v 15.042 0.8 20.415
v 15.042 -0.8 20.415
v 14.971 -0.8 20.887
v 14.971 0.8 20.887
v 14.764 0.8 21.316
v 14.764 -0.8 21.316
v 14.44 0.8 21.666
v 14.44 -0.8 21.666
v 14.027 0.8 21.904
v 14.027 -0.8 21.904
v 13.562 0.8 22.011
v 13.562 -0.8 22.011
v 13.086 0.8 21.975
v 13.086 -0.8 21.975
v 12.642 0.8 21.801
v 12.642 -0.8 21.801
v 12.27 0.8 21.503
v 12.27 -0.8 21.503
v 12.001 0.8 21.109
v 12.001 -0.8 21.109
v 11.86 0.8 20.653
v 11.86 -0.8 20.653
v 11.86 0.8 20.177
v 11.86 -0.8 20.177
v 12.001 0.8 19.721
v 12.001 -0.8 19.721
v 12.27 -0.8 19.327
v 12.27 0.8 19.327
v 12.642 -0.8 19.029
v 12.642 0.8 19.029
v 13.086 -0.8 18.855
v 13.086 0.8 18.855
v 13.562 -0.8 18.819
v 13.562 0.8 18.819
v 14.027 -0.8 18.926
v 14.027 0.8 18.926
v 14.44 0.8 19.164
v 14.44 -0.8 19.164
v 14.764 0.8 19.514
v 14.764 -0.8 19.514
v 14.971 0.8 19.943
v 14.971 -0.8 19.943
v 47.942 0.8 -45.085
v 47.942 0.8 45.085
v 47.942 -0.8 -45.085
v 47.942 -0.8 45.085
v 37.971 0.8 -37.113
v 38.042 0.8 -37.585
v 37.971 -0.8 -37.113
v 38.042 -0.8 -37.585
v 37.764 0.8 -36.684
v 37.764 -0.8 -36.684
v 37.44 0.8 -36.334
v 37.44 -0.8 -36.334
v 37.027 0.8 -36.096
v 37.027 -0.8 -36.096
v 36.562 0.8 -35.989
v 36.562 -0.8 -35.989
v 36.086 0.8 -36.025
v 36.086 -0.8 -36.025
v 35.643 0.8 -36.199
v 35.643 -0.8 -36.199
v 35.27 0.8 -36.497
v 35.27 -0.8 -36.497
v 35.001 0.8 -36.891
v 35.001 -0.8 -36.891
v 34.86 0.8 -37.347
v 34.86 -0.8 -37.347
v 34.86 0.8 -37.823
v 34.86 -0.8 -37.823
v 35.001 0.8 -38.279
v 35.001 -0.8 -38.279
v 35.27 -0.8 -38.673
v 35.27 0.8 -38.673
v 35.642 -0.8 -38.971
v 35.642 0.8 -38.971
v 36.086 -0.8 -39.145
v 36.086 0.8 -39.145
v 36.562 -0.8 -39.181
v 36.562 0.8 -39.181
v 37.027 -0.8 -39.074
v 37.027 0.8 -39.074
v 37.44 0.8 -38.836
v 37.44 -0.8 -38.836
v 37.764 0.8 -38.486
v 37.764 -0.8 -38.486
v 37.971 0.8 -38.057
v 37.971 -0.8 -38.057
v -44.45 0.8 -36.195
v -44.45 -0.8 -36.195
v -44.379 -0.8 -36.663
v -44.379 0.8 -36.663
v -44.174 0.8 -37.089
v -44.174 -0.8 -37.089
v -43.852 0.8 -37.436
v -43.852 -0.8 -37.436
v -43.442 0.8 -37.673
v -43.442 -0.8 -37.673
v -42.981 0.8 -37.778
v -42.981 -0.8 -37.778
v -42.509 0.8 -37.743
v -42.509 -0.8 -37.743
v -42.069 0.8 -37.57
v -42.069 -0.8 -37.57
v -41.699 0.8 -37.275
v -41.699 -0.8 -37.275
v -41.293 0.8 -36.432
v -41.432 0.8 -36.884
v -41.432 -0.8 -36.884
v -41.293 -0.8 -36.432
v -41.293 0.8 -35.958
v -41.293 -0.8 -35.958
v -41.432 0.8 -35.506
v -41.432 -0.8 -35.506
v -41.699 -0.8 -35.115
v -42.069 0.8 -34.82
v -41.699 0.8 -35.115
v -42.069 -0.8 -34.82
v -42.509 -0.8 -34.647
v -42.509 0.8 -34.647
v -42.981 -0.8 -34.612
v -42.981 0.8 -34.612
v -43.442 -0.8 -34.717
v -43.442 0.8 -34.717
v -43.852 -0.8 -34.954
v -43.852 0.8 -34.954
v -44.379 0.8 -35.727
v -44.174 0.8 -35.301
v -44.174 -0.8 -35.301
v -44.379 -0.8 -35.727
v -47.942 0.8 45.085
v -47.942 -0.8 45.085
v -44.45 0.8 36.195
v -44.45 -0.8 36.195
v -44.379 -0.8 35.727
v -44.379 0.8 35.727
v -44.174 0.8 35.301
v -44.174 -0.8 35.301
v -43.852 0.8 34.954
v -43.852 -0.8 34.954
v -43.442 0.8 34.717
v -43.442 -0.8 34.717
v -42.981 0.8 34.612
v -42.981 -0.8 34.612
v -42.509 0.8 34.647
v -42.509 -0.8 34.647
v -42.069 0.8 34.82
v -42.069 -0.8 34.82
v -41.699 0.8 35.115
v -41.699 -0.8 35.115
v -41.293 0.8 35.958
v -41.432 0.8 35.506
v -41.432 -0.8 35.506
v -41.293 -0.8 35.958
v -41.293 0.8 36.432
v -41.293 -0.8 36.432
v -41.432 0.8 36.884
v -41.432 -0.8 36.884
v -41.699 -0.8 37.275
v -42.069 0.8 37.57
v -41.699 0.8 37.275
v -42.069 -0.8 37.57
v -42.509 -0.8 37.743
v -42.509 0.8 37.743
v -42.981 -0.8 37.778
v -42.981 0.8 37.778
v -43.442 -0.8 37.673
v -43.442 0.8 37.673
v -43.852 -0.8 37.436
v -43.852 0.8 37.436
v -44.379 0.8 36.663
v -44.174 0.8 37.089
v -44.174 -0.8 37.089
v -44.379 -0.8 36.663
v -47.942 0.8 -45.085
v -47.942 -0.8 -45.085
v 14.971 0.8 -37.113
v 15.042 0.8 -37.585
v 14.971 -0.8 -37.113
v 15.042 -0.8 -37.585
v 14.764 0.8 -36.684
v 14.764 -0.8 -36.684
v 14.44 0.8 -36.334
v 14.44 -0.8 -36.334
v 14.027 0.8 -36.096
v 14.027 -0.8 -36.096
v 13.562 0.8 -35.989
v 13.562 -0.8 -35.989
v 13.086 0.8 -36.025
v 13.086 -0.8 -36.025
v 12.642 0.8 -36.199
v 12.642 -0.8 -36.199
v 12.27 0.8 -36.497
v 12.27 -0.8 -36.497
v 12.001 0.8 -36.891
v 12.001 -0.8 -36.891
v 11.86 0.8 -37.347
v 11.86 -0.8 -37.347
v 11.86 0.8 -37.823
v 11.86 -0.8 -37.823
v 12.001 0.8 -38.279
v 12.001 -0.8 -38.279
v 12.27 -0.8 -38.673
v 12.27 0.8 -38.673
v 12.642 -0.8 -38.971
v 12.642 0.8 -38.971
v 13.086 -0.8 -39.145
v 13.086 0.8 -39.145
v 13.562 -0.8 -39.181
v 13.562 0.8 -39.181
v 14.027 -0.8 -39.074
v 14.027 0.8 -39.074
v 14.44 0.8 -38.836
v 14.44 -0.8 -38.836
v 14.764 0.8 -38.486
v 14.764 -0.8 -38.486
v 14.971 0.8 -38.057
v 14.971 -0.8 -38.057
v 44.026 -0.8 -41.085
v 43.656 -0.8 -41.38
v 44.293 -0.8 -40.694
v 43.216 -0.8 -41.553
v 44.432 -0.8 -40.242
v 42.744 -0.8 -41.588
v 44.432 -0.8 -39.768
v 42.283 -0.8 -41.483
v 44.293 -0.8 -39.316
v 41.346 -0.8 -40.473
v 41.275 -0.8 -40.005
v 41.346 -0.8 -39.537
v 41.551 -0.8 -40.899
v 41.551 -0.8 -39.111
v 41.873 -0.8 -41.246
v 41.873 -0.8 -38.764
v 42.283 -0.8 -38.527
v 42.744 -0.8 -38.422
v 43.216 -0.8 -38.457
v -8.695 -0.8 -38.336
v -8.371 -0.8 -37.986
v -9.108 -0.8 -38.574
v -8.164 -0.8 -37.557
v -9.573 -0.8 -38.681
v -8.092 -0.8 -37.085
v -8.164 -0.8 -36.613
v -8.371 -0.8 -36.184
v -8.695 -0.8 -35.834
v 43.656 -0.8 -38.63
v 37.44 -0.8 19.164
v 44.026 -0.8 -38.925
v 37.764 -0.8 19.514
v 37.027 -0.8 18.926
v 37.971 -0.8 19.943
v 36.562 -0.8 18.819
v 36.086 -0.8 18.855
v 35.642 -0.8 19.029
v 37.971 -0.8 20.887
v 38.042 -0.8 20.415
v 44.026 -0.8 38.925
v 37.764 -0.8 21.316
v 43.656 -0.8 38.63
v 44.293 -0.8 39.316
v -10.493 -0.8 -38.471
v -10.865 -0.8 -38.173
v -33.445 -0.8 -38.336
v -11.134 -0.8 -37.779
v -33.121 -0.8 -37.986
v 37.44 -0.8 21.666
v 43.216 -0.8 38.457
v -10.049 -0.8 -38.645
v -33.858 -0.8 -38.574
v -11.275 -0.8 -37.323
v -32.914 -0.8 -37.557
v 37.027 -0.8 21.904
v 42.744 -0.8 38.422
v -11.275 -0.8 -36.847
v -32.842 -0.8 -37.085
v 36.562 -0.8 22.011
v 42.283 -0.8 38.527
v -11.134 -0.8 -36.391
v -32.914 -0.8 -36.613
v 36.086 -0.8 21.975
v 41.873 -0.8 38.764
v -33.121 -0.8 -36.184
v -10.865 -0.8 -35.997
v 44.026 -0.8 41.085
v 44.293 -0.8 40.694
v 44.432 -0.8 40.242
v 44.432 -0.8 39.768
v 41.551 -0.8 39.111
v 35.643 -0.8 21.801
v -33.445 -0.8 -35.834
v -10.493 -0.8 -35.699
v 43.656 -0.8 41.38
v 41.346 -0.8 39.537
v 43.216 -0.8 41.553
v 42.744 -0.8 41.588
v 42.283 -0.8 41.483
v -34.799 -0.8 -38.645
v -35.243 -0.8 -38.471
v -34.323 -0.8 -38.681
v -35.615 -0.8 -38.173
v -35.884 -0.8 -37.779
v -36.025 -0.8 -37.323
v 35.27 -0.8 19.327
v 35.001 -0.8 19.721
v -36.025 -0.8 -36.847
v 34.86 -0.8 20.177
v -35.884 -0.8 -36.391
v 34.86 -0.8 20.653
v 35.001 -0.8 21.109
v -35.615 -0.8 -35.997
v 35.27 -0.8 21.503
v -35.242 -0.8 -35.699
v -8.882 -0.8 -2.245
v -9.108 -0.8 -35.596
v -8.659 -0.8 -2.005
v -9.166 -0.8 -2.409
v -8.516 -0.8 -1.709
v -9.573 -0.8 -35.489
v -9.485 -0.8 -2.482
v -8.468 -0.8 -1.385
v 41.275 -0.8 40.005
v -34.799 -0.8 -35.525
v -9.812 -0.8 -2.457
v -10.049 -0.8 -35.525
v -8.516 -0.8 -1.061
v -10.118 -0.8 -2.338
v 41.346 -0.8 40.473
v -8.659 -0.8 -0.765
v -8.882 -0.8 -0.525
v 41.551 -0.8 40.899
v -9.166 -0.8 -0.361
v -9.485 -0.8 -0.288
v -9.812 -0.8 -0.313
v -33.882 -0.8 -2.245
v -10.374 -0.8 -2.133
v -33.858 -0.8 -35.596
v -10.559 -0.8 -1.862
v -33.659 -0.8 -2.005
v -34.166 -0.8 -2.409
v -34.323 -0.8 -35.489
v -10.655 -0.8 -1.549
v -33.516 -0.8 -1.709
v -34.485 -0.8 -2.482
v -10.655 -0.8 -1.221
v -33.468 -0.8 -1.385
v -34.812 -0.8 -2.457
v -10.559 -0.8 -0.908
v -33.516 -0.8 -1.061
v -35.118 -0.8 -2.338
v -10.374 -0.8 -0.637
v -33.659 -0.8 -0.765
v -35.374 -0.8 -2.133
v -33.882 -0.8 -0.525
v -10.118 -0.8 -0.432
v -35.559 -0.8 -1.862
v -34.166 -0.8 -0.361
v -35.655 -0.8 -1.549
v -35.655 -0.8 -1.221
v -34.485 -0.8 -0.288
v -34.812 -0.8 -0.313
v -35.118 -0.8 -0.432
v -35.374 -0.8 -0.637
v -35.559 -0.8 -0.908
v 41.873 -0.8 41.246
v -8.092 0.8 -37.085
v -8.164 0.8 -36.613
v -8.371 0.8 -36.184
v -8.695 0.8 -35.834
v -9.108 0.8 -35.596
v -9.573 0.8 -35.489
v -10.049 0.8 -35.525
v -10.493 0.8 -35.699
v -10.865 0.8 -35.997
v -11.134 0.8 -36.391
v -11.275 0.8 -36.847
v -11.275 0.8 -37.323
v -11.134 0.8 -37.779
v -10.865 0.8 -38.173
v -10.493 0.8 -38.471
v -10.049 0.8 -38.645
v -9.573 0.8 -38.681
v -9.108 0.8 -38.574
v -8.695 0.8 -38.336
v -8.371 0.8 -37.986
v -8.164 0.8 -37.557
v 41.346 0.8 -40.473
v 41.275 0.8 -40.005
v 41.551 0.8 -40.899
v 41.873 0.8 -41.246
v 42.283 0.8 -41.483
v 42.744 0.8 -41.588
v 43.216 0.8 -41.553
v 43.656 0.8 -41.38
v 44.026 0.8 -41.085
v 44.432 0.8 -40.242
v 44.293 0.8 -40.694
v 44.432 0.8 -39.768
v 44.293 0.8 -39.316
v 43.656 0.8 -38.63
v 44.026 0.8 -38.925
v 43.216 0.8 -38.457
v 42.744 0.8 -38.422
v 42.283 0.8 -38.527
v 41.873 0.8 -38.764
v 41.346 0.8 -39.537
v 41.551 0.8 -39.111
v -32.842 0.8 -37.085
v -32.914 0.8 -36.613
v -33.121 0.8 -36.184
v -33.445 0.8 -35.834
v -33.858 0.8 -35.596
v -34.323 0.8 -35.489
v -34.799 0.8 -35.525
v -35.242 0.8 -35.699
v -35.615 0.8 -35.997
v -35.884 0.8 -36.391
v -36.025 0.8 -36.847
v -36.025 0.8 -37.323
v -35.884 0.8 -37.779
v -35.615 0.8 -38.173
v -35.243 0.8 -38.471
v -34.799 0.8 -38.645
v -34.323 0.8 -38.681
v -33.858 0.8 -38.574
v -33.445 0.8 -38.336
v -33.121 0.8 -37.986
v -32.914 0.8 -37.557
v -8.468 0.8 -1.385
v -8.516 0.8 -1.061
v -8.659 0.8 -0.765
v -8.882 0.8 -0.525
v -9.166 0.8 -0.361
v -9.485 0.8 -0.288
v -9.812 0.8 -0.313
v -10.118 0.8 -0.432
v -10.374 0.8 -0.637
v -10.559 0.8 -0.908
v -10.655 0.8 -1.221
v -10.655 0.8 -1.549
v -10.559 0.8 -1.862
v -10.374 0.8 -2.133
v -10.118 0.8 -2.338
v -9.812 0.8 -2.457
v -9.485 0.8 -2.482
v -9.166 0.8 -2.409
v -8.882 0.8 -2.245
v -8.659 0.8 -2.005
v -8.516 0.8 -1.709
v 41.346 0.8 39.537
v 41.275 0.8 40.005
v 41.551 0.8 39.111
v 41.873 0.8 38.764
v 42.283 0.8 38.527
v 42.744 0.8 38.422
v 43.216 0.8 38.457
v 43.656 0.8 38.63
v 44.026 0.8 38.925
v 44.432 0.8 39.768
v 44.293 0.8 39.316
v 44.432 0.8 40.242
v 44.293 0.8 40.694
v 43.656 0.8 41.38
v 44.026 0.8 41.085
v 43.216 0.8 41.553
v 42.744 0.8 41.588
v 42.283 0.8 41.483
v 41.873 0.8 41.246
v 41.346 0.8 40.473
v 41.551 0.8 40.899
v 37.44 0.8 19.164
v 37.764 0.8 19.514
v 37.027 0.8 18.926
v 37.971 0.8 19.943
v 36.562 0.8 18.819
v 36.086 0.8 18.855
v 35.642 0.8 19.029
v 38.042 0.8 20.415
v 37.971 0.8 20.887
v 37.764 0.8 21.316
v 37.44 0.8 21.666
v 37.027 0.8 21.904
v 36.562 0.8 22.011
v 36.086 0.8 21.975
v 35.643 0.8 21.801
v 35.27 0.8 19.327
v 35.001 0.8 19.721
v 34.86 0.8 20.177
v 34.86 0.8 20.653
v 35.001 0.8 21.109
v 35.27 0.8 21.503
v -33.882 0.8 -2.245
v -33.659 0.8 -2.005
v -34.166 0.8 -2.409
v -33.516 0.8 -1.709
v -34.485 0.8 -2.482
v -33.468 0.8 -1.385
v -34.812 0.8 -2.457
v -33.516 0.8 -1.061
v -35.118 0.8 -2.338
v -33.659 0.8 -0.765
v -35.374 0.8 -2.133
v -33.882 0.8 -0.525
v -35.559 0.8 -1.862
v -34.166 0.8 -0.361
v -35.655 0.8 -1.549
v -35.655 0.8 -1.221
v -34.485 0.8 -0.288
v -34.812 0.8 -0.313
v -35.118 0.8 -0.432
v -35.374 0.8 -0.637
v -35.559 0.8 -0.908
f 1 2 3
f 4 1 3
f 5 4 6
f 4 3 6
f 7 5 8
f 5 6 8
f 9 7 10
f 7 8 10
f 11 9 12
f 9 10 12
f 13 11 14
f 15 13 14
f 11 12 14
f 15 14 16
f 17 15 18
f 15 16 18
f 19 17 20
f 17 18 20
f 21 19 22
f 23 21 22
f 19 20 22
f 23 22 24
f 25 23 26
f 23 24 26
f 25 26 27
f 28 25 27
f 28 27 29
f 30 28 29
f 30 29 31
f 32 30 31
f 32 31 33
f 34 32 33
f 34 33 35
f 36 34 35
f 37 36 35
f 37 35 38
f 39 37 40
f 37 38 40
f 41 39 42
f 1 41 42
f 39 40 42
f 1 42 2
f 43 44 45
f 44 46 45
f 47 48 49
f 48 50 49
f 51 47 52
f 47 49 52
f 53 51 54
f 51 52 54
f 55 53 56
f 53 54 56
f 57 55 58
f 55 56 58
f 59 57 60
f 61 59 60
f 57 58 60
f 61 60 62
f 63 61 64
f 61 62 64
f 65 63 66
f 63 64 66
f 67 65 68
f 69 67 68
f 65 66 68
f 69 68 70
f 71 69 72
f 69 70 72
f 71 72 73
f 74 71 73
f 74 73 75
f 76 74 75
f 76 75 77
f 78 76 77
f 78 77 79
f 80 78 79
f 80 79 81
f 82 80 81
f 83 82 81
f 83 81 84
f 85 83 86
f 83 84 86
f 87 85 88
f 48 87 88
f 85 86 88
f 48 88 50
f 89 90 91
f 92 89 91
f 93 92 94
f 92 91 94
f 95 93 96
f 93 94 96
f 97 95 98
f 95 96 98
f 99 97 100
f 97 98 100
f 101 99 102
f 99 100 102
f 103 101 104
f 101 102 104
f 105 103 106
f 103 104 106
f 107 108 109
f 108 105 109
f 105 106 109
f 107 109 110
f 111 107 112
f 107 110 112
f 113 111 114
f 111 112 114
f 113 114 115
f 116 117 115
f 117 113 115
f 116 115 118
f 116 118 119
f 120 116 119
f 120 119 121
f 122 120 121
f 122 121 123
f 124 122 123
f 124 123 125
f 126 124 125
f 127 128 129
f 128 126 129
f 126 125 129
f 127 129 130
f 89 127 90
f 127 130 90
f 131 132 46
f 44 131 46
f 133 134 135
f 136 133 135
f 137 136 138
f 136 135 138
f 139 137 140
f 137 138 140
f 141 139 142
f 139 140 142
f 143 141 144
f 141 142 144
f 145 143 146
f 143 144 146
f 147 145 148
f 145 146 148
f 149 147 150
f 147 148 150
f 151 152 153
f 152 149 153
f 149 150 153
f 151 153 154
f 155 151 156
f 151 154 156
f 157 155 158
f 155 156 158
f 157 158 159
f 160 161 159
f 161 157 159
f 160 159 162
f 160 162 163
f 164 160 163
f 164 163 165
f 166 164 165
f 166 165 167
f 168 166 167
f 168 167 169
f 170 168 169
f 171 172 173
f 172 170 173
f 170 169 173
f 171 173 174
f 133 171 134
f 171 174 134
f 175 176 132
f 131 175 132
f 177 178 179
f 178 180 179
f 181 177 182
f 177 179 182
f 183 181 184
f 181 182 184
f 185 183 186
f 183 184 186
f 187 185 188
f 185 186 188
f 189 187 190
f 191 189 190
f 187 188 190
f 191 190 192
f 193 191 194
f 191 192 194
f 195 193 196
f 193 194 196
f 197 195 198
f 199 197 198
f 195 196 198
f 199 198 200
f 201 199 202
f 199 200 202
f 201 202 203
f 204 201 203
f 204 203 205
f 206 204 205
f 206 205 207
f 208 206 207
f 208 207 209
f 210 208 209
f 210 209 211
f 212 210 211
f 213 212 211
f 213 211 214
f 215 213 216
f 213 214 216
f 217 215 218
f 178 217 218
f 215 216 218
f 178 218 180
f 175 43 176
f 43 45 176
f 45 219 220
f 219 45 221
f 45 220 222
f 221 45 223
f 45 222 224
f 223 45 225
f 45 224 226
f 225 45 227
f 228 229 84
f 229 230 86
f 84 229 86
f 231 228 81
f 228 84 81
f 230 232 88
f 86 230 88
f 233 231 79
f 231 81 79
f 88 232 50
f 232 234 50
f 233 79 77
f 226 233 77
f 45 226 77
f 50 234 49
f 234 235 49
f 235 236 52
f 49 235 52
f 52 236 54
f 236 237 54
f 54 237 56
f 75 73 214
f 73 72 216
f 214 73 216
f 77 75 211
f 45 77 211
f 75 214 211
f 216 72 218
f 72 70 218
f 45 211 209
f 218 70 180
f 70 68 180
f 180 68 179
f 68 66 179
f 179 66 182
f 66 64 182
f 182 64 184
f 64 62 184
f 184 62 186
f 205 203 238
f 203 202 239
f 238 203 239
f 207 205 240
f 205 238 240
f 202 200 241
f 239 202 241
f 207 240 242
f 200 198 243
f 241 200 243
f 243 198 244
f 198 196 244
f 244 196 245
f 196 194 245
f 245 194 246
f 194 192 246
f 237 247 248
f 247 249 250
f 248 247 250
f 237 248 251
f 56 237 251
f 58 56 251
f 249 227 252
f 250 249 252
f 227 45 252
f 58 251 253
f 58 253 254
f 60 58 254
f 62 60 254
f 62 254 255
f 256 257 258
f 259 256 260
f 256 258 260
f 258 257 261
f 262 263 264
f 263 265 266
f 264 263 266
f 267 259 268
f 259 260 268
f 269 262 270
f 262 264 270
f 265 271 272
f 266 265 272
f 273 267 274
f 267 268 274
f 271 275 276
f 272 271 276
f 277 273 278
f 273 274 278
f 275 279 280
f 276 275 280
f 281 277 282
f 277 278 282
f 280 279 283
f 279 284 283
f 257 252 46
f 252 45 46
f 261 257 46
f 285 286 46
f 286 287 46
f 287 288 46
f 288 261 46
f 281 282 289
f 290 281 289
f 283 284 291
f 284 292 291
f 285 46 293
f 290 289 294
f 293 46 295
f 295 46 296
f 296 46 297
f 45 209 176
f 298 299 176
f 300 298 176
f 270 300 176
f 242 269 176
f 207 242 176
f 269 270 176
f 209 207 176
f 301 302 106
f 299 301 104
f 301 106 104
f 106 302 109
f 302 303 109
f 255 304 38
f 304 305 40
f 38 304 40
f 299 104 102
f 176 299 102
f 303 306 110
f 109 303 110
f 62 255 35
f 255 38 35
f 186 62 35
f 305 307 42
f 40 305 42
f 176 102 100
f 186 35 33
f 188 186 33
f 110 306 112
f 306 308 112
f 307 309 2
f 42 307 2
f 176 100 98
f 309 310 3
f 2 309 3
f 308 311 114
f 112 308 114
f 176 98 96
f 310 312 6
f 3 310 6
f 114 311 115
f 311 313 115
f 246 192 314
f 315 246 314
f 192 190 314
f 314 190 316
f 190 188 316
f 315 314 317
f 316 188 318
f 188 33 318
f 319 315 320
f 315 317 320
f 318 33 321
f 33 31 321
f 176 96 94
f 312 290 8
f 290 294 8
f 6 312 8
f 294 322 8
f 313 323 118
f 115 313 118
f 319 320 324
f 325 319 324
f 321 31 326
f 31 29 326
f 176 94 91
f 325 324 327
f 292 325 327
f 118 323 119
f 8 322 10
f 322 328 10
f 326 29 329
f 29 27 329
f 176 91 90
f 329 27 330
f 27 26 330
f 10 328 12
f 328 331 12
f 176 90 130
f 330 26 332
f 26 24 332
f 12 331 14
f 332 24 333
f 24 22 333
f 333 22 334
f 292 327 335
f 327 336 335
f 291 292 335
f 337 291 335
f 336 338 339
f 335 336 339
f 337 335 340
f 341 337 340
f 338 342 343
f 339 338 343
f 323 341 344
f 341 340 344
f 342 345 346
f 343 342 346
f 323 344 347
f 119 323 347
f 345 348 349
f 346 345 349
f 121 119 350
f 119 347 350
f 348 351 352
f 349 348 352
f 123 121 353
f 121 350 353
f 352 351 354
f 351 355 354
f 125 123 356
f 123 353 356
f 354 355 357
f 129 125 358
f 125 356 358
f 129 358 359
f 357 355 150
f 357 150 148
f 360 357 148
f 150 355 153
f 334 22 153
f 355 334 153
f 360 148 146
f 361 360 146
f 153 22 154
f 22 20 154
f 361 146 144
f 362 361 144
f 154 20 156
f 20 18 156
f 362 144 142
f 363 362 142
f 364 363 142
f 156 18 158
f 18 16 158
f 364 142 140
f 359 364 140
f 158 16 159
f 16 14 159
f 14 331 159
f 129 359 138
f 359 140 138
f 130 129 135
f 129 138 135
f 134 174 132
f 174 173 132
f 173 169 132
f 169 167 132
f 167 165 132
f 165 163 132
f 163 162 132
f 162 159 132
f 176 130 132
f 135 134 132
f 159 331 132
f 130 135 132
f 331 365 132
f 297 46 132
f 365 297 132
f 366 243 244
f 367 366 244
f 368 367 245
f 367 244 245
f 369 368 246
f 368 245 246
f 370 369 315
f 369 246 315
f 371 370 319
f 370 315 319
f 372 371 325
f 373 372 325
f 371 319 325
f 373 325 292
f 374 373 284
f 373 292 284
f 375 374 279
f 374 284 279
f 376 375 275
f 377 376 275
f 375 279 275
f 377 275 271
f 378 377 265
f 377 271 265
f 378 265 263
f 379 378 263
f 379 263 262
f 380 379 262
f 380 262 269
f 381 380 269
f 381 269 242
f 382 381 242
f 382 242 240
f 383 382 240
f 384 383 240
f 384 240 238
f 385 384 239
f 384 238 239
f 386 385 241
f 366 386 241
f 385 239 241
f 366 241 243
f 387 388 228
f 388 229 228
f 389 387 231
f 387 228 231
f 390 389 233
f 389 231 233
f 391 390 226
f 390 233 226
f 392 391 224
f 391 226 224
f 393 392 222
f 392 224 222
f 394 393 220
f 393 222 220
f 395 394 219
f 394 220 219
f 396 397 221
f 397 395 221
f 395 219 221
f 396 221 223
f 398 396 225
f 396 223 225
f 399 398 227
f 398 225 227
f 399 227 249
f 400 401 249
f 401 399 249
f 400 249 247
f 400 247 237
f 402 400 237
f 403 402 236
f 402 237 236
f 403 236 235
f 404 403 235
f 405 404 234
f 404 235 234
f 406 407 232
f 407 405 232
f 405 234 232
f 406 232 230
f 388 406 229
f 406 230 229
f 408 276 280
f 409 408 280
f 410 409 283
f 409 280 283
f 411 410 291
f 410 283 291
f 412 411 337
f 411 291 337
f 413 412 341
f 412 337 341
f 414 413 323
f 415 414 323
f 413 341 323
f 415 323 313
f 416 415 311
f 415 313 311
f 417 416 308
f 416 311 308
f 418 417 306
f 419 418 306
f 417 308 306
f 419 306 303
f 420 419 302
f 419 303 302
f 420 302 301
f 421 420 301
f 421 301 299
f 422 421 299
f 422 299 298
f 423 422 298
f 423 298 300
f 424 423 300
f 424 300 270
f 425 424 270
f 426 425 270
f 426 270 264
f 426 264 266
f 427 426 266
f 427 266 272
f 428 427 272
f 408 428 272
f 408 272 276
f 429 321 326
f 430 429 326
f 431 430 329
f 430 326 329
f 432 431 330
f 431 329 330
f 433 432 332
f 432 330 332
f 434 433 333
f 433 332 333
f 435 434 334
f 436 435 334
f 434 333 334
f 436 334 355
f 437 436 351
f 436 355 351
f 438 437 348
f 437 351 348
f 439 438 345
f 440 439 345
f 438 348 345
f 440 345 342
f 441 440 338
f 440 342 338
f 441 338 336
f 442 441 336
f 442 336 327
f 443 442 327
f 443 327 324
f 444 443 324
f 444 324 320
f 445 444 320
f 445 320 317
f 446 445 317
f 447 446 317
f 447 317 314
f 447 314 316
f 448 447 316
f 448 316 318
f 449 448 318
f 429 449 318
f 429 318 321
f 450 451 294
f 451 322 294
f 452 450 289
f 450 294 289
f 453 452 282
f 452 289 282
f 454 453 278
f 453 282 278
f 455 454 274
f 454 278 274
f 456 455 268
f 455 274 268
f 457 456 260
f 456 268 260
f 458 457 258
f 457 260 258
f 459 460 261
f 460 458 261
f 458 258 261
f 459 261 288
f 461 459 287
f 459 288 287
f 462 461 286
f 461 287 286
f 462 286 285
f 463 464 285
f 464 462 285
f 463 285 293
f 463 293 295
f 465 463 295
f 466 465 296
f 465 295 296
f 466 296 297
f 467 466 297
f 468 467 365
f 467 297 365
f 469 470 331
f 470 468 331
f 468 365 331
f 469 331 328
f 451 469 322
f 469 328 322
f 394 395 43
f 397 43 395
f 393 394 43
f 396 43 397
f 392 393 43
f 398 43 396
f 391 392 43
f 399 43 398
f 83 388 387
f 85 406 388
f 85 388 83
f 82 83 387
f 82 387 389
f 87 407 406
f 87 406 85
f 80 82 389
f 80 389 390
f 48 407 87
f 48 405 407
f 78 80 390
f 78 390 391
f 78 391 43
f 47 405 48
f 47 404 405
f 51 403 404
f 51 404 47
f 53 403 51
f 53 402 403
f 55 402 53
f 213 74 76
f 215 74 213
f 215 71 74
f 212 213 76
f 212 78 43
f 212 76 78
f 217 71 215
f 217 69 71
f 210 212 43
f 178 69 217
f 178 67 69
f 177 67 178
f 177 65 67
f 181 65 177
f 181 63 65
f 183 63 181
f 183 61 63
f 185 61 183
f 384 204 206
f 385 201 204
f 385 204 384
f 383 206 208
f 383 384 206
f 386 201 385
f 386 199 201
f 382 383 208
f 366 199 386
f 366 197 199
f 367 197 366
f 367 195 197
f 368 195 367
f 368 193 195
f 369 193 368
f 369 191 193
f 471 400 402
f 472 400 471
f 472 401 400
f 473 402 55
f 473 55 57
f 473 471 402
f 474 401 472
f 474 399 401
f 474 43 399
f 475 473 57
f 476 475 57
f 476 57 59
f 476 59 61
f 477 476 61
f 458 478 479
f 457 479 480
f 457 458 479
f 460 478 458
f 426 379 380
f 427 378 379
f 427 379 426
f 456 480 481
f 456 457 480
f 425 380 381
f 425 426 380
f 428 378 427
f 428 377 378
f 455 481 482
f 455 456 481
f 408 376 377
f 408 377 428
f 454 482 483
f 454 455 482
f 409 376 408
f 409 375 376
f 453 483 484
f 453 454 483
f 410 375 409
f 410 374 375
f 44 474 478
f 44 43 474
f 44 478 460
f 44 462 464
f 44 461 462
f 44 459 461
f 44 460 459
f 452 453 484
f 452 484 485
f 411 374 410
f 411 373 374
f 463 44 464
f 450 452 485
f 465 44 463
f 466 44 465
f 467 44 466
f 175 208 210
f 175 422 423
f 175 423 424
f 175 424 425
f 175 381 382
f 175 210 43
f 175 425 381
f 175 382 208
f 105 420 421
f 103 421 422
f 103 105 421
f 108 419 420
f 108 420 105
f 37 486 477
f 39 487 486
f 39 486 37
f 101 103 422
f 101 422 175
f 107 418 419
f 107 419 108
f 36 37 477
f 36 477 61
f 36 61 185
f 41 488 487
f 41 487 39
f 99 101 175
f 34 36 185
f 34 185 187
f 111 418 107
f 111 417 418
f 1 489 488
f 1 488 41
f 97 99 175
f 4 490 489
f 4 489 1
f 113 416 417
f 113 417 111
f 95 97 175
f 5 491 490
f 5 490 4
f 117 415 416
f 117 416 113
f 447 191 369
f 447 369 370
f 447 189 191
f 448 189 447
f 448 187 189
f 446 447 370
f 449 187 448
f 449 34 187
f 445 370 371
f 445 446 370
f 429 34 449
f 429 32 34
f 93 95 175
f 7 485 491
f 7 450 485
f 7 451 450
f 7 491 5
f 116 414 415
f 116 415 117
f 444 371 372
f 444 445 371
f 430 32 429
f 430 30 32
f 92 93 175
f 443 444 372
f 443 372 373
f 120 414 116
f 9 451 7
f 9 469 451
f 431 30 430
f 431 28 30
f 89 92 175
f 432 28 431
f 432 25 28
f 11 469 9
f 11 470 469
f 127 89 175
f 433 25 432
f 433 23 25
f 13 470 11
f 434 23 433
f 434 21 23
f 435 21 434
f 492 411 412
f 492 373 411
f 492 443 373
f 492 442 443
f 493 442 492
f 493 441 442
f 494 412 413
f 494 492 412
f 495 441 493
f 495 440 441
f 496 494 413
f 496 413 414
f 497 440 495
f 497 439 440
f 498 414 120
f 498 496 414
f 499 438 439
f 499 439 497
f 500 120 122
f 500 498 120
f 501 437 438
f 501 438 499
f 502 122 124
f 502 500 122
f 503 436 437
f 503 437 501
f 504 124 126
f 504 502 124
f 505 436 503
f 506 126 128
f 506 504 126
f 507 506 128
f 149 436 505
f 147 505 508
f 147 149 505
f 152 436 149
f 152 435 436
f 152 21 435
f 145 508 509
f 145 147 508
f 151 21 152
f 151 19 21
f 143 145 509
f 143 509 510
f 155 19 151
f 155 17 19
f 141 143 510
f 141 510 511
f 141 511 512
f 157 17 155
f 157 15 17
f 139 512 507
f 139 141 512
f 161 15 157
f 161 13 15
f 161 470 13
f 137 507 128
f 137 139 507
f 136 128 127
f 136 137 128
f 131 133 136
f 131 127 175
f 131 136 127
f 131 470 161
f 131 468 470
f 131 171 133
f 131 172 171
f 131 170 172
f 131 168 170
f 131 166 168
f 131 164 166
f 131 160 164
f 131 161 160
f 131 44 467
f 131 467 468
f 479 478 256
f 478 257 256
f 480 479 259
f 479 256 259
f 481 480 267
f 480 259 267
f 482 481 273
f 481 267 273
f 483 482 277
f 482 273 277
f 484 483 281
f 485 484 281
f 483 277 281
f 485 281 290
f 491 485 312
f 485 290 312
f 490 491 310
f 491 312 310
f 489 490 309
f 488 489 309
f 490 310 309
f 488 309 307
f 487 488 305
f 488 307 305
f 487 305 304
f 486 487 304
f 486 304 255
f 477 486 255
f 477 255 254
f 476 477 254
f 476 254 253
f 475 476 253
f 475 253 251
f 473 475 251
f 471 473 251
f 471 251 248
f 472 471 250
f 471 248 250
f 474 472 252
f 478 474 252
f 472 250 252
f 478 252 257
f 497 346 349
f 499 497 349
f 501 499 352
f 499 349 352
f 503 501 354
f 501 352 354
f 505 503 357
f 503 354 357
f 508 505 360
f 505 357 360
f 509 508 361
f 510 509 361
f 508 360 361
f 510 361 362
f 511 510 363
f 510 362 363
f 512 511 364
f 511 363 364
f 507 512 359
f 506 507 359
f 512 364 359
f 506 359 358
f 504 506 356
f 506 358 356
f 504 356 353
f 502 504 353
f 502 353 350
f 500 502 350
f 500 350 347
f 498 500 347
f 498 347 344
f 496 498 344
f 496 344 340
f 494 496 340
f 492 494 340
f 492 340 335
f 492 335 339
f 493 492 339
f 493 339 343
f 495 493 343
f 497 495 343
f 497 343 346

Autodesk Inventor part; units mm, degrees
ref_plane "YZ Plane" through (0, 0, 0) normal (1, 0, 0) x (0, 1, 0)
ref_plane "XZ Plane" through (0, 0, 0) normal (0, 1, 0) x (-1, 0, 0)
ref_plane "XY Plane" through (0, 0, 0) normal (0, 0, 1) x (1, 0, 0)
sketch "Sketch1" plane through (0, 0, 0) normal (0, 1, 0) x (-1, 0, 0)
  line L0 (47.9425, 45.085) -> (-47.9425, 45.085)
  line L1 (-47.9425, 45.085) -> (-47.9425, -45.085)
  line L2 (-47.9425, -45.085) -> (47.9425, -45.085)
  line L3 (47.9425, -45.085) -> (47.9425, 45.085)
  line L4 (47.9425, 45.085) -> (-47.9425, -45.085) construction
  line L5 (-47.9425, 45.085) -> (47.9425, -45.085) construction
  circle A0 centre (42.8625, 36.195) radius 1.5875
  circle A1 centre (42.8625, -36.195) radius 1.5875
  circle A2 centre (-42.8625, -40.005) radius 1.5875
  circle A3 centre (-42.8625, 40.005) radius 1.5875
  point P0 (0, 0)
  dimension "d0" = 90.17
  dimension "d1" = 95.885
  dimension "d2" = 5.08
  dimension "d3" = 5.08
  dimension "d4" = 5.08
  dimension "d5" = 8.89
  dimension "d6" = 8.89
  dimension "d7" = 5.08
  dimension "d8" = 3.175
  dimension "d9" = 3.175
  dimension "d10" = 3.175
  dimension "d11" = 3.175
extrude "Extrusion1" add sketch "Sketch1" along normal mid plane 1.6
sketch "Sketch2" plane through (0, -0.8, 0) normal (0, -1, 0) x (1, 0, 0)
  circle A0 centre (36.4425, 20.415) radius 1.6
  circle A1 centre (13.4425, 20.415) radius 1.6
  circle A2 centre (36.4425, -37.585) radius 1.6
  circle A3 centre (13.4425, -37.585) radius 1.6
  circle A4 centre (-34.4425, -37.085) radius 1.6
  circle A5 centre (-9.6925, -37.085) radius 1.6
  circle A6 centre (-34.5675, -1.385) radius 1.1
  circle A7 centre (-9.5675, -1.385) radius 1.1
  point P0 (0, 0)
  dimension "d14" = 9.5675
  dimension "d15" = 34.5675
  dimension "d16" = 9.6925
  dimension "d17" = 34.4425
  dimension "d18" = 1.385
  dimension "d19" = 2.2
  dimension "d20" = 1.385
  dimension "d21" = 37.085
  dimension "d22" = 37.085
  dimension "d23" = 33.0002
  dimension "d24" = 3.2
  dimension "d25" = 3.2
  dimension "d26" = 20.415
  dimension "d28" = 13.4425
  dimension "d29" = 36.4425
  dimension "d30" = 37.585
  dimension "d31" = 20.415
  dimension "d32" = 19.8
  dimension "d34" = 58
extrude "Extrusion2" cut sketch "Sketch2" against normal up to surface (1.6 mm away)
equation "\"d7\" = d4"
equation "\"d9\" = d8"
equation "\"d10\" = d8"
equation "\"d11\" = d8"
properties part number "PC 104 size and hole model_Hermes_Top_Mount_V1" material "FR-4"
